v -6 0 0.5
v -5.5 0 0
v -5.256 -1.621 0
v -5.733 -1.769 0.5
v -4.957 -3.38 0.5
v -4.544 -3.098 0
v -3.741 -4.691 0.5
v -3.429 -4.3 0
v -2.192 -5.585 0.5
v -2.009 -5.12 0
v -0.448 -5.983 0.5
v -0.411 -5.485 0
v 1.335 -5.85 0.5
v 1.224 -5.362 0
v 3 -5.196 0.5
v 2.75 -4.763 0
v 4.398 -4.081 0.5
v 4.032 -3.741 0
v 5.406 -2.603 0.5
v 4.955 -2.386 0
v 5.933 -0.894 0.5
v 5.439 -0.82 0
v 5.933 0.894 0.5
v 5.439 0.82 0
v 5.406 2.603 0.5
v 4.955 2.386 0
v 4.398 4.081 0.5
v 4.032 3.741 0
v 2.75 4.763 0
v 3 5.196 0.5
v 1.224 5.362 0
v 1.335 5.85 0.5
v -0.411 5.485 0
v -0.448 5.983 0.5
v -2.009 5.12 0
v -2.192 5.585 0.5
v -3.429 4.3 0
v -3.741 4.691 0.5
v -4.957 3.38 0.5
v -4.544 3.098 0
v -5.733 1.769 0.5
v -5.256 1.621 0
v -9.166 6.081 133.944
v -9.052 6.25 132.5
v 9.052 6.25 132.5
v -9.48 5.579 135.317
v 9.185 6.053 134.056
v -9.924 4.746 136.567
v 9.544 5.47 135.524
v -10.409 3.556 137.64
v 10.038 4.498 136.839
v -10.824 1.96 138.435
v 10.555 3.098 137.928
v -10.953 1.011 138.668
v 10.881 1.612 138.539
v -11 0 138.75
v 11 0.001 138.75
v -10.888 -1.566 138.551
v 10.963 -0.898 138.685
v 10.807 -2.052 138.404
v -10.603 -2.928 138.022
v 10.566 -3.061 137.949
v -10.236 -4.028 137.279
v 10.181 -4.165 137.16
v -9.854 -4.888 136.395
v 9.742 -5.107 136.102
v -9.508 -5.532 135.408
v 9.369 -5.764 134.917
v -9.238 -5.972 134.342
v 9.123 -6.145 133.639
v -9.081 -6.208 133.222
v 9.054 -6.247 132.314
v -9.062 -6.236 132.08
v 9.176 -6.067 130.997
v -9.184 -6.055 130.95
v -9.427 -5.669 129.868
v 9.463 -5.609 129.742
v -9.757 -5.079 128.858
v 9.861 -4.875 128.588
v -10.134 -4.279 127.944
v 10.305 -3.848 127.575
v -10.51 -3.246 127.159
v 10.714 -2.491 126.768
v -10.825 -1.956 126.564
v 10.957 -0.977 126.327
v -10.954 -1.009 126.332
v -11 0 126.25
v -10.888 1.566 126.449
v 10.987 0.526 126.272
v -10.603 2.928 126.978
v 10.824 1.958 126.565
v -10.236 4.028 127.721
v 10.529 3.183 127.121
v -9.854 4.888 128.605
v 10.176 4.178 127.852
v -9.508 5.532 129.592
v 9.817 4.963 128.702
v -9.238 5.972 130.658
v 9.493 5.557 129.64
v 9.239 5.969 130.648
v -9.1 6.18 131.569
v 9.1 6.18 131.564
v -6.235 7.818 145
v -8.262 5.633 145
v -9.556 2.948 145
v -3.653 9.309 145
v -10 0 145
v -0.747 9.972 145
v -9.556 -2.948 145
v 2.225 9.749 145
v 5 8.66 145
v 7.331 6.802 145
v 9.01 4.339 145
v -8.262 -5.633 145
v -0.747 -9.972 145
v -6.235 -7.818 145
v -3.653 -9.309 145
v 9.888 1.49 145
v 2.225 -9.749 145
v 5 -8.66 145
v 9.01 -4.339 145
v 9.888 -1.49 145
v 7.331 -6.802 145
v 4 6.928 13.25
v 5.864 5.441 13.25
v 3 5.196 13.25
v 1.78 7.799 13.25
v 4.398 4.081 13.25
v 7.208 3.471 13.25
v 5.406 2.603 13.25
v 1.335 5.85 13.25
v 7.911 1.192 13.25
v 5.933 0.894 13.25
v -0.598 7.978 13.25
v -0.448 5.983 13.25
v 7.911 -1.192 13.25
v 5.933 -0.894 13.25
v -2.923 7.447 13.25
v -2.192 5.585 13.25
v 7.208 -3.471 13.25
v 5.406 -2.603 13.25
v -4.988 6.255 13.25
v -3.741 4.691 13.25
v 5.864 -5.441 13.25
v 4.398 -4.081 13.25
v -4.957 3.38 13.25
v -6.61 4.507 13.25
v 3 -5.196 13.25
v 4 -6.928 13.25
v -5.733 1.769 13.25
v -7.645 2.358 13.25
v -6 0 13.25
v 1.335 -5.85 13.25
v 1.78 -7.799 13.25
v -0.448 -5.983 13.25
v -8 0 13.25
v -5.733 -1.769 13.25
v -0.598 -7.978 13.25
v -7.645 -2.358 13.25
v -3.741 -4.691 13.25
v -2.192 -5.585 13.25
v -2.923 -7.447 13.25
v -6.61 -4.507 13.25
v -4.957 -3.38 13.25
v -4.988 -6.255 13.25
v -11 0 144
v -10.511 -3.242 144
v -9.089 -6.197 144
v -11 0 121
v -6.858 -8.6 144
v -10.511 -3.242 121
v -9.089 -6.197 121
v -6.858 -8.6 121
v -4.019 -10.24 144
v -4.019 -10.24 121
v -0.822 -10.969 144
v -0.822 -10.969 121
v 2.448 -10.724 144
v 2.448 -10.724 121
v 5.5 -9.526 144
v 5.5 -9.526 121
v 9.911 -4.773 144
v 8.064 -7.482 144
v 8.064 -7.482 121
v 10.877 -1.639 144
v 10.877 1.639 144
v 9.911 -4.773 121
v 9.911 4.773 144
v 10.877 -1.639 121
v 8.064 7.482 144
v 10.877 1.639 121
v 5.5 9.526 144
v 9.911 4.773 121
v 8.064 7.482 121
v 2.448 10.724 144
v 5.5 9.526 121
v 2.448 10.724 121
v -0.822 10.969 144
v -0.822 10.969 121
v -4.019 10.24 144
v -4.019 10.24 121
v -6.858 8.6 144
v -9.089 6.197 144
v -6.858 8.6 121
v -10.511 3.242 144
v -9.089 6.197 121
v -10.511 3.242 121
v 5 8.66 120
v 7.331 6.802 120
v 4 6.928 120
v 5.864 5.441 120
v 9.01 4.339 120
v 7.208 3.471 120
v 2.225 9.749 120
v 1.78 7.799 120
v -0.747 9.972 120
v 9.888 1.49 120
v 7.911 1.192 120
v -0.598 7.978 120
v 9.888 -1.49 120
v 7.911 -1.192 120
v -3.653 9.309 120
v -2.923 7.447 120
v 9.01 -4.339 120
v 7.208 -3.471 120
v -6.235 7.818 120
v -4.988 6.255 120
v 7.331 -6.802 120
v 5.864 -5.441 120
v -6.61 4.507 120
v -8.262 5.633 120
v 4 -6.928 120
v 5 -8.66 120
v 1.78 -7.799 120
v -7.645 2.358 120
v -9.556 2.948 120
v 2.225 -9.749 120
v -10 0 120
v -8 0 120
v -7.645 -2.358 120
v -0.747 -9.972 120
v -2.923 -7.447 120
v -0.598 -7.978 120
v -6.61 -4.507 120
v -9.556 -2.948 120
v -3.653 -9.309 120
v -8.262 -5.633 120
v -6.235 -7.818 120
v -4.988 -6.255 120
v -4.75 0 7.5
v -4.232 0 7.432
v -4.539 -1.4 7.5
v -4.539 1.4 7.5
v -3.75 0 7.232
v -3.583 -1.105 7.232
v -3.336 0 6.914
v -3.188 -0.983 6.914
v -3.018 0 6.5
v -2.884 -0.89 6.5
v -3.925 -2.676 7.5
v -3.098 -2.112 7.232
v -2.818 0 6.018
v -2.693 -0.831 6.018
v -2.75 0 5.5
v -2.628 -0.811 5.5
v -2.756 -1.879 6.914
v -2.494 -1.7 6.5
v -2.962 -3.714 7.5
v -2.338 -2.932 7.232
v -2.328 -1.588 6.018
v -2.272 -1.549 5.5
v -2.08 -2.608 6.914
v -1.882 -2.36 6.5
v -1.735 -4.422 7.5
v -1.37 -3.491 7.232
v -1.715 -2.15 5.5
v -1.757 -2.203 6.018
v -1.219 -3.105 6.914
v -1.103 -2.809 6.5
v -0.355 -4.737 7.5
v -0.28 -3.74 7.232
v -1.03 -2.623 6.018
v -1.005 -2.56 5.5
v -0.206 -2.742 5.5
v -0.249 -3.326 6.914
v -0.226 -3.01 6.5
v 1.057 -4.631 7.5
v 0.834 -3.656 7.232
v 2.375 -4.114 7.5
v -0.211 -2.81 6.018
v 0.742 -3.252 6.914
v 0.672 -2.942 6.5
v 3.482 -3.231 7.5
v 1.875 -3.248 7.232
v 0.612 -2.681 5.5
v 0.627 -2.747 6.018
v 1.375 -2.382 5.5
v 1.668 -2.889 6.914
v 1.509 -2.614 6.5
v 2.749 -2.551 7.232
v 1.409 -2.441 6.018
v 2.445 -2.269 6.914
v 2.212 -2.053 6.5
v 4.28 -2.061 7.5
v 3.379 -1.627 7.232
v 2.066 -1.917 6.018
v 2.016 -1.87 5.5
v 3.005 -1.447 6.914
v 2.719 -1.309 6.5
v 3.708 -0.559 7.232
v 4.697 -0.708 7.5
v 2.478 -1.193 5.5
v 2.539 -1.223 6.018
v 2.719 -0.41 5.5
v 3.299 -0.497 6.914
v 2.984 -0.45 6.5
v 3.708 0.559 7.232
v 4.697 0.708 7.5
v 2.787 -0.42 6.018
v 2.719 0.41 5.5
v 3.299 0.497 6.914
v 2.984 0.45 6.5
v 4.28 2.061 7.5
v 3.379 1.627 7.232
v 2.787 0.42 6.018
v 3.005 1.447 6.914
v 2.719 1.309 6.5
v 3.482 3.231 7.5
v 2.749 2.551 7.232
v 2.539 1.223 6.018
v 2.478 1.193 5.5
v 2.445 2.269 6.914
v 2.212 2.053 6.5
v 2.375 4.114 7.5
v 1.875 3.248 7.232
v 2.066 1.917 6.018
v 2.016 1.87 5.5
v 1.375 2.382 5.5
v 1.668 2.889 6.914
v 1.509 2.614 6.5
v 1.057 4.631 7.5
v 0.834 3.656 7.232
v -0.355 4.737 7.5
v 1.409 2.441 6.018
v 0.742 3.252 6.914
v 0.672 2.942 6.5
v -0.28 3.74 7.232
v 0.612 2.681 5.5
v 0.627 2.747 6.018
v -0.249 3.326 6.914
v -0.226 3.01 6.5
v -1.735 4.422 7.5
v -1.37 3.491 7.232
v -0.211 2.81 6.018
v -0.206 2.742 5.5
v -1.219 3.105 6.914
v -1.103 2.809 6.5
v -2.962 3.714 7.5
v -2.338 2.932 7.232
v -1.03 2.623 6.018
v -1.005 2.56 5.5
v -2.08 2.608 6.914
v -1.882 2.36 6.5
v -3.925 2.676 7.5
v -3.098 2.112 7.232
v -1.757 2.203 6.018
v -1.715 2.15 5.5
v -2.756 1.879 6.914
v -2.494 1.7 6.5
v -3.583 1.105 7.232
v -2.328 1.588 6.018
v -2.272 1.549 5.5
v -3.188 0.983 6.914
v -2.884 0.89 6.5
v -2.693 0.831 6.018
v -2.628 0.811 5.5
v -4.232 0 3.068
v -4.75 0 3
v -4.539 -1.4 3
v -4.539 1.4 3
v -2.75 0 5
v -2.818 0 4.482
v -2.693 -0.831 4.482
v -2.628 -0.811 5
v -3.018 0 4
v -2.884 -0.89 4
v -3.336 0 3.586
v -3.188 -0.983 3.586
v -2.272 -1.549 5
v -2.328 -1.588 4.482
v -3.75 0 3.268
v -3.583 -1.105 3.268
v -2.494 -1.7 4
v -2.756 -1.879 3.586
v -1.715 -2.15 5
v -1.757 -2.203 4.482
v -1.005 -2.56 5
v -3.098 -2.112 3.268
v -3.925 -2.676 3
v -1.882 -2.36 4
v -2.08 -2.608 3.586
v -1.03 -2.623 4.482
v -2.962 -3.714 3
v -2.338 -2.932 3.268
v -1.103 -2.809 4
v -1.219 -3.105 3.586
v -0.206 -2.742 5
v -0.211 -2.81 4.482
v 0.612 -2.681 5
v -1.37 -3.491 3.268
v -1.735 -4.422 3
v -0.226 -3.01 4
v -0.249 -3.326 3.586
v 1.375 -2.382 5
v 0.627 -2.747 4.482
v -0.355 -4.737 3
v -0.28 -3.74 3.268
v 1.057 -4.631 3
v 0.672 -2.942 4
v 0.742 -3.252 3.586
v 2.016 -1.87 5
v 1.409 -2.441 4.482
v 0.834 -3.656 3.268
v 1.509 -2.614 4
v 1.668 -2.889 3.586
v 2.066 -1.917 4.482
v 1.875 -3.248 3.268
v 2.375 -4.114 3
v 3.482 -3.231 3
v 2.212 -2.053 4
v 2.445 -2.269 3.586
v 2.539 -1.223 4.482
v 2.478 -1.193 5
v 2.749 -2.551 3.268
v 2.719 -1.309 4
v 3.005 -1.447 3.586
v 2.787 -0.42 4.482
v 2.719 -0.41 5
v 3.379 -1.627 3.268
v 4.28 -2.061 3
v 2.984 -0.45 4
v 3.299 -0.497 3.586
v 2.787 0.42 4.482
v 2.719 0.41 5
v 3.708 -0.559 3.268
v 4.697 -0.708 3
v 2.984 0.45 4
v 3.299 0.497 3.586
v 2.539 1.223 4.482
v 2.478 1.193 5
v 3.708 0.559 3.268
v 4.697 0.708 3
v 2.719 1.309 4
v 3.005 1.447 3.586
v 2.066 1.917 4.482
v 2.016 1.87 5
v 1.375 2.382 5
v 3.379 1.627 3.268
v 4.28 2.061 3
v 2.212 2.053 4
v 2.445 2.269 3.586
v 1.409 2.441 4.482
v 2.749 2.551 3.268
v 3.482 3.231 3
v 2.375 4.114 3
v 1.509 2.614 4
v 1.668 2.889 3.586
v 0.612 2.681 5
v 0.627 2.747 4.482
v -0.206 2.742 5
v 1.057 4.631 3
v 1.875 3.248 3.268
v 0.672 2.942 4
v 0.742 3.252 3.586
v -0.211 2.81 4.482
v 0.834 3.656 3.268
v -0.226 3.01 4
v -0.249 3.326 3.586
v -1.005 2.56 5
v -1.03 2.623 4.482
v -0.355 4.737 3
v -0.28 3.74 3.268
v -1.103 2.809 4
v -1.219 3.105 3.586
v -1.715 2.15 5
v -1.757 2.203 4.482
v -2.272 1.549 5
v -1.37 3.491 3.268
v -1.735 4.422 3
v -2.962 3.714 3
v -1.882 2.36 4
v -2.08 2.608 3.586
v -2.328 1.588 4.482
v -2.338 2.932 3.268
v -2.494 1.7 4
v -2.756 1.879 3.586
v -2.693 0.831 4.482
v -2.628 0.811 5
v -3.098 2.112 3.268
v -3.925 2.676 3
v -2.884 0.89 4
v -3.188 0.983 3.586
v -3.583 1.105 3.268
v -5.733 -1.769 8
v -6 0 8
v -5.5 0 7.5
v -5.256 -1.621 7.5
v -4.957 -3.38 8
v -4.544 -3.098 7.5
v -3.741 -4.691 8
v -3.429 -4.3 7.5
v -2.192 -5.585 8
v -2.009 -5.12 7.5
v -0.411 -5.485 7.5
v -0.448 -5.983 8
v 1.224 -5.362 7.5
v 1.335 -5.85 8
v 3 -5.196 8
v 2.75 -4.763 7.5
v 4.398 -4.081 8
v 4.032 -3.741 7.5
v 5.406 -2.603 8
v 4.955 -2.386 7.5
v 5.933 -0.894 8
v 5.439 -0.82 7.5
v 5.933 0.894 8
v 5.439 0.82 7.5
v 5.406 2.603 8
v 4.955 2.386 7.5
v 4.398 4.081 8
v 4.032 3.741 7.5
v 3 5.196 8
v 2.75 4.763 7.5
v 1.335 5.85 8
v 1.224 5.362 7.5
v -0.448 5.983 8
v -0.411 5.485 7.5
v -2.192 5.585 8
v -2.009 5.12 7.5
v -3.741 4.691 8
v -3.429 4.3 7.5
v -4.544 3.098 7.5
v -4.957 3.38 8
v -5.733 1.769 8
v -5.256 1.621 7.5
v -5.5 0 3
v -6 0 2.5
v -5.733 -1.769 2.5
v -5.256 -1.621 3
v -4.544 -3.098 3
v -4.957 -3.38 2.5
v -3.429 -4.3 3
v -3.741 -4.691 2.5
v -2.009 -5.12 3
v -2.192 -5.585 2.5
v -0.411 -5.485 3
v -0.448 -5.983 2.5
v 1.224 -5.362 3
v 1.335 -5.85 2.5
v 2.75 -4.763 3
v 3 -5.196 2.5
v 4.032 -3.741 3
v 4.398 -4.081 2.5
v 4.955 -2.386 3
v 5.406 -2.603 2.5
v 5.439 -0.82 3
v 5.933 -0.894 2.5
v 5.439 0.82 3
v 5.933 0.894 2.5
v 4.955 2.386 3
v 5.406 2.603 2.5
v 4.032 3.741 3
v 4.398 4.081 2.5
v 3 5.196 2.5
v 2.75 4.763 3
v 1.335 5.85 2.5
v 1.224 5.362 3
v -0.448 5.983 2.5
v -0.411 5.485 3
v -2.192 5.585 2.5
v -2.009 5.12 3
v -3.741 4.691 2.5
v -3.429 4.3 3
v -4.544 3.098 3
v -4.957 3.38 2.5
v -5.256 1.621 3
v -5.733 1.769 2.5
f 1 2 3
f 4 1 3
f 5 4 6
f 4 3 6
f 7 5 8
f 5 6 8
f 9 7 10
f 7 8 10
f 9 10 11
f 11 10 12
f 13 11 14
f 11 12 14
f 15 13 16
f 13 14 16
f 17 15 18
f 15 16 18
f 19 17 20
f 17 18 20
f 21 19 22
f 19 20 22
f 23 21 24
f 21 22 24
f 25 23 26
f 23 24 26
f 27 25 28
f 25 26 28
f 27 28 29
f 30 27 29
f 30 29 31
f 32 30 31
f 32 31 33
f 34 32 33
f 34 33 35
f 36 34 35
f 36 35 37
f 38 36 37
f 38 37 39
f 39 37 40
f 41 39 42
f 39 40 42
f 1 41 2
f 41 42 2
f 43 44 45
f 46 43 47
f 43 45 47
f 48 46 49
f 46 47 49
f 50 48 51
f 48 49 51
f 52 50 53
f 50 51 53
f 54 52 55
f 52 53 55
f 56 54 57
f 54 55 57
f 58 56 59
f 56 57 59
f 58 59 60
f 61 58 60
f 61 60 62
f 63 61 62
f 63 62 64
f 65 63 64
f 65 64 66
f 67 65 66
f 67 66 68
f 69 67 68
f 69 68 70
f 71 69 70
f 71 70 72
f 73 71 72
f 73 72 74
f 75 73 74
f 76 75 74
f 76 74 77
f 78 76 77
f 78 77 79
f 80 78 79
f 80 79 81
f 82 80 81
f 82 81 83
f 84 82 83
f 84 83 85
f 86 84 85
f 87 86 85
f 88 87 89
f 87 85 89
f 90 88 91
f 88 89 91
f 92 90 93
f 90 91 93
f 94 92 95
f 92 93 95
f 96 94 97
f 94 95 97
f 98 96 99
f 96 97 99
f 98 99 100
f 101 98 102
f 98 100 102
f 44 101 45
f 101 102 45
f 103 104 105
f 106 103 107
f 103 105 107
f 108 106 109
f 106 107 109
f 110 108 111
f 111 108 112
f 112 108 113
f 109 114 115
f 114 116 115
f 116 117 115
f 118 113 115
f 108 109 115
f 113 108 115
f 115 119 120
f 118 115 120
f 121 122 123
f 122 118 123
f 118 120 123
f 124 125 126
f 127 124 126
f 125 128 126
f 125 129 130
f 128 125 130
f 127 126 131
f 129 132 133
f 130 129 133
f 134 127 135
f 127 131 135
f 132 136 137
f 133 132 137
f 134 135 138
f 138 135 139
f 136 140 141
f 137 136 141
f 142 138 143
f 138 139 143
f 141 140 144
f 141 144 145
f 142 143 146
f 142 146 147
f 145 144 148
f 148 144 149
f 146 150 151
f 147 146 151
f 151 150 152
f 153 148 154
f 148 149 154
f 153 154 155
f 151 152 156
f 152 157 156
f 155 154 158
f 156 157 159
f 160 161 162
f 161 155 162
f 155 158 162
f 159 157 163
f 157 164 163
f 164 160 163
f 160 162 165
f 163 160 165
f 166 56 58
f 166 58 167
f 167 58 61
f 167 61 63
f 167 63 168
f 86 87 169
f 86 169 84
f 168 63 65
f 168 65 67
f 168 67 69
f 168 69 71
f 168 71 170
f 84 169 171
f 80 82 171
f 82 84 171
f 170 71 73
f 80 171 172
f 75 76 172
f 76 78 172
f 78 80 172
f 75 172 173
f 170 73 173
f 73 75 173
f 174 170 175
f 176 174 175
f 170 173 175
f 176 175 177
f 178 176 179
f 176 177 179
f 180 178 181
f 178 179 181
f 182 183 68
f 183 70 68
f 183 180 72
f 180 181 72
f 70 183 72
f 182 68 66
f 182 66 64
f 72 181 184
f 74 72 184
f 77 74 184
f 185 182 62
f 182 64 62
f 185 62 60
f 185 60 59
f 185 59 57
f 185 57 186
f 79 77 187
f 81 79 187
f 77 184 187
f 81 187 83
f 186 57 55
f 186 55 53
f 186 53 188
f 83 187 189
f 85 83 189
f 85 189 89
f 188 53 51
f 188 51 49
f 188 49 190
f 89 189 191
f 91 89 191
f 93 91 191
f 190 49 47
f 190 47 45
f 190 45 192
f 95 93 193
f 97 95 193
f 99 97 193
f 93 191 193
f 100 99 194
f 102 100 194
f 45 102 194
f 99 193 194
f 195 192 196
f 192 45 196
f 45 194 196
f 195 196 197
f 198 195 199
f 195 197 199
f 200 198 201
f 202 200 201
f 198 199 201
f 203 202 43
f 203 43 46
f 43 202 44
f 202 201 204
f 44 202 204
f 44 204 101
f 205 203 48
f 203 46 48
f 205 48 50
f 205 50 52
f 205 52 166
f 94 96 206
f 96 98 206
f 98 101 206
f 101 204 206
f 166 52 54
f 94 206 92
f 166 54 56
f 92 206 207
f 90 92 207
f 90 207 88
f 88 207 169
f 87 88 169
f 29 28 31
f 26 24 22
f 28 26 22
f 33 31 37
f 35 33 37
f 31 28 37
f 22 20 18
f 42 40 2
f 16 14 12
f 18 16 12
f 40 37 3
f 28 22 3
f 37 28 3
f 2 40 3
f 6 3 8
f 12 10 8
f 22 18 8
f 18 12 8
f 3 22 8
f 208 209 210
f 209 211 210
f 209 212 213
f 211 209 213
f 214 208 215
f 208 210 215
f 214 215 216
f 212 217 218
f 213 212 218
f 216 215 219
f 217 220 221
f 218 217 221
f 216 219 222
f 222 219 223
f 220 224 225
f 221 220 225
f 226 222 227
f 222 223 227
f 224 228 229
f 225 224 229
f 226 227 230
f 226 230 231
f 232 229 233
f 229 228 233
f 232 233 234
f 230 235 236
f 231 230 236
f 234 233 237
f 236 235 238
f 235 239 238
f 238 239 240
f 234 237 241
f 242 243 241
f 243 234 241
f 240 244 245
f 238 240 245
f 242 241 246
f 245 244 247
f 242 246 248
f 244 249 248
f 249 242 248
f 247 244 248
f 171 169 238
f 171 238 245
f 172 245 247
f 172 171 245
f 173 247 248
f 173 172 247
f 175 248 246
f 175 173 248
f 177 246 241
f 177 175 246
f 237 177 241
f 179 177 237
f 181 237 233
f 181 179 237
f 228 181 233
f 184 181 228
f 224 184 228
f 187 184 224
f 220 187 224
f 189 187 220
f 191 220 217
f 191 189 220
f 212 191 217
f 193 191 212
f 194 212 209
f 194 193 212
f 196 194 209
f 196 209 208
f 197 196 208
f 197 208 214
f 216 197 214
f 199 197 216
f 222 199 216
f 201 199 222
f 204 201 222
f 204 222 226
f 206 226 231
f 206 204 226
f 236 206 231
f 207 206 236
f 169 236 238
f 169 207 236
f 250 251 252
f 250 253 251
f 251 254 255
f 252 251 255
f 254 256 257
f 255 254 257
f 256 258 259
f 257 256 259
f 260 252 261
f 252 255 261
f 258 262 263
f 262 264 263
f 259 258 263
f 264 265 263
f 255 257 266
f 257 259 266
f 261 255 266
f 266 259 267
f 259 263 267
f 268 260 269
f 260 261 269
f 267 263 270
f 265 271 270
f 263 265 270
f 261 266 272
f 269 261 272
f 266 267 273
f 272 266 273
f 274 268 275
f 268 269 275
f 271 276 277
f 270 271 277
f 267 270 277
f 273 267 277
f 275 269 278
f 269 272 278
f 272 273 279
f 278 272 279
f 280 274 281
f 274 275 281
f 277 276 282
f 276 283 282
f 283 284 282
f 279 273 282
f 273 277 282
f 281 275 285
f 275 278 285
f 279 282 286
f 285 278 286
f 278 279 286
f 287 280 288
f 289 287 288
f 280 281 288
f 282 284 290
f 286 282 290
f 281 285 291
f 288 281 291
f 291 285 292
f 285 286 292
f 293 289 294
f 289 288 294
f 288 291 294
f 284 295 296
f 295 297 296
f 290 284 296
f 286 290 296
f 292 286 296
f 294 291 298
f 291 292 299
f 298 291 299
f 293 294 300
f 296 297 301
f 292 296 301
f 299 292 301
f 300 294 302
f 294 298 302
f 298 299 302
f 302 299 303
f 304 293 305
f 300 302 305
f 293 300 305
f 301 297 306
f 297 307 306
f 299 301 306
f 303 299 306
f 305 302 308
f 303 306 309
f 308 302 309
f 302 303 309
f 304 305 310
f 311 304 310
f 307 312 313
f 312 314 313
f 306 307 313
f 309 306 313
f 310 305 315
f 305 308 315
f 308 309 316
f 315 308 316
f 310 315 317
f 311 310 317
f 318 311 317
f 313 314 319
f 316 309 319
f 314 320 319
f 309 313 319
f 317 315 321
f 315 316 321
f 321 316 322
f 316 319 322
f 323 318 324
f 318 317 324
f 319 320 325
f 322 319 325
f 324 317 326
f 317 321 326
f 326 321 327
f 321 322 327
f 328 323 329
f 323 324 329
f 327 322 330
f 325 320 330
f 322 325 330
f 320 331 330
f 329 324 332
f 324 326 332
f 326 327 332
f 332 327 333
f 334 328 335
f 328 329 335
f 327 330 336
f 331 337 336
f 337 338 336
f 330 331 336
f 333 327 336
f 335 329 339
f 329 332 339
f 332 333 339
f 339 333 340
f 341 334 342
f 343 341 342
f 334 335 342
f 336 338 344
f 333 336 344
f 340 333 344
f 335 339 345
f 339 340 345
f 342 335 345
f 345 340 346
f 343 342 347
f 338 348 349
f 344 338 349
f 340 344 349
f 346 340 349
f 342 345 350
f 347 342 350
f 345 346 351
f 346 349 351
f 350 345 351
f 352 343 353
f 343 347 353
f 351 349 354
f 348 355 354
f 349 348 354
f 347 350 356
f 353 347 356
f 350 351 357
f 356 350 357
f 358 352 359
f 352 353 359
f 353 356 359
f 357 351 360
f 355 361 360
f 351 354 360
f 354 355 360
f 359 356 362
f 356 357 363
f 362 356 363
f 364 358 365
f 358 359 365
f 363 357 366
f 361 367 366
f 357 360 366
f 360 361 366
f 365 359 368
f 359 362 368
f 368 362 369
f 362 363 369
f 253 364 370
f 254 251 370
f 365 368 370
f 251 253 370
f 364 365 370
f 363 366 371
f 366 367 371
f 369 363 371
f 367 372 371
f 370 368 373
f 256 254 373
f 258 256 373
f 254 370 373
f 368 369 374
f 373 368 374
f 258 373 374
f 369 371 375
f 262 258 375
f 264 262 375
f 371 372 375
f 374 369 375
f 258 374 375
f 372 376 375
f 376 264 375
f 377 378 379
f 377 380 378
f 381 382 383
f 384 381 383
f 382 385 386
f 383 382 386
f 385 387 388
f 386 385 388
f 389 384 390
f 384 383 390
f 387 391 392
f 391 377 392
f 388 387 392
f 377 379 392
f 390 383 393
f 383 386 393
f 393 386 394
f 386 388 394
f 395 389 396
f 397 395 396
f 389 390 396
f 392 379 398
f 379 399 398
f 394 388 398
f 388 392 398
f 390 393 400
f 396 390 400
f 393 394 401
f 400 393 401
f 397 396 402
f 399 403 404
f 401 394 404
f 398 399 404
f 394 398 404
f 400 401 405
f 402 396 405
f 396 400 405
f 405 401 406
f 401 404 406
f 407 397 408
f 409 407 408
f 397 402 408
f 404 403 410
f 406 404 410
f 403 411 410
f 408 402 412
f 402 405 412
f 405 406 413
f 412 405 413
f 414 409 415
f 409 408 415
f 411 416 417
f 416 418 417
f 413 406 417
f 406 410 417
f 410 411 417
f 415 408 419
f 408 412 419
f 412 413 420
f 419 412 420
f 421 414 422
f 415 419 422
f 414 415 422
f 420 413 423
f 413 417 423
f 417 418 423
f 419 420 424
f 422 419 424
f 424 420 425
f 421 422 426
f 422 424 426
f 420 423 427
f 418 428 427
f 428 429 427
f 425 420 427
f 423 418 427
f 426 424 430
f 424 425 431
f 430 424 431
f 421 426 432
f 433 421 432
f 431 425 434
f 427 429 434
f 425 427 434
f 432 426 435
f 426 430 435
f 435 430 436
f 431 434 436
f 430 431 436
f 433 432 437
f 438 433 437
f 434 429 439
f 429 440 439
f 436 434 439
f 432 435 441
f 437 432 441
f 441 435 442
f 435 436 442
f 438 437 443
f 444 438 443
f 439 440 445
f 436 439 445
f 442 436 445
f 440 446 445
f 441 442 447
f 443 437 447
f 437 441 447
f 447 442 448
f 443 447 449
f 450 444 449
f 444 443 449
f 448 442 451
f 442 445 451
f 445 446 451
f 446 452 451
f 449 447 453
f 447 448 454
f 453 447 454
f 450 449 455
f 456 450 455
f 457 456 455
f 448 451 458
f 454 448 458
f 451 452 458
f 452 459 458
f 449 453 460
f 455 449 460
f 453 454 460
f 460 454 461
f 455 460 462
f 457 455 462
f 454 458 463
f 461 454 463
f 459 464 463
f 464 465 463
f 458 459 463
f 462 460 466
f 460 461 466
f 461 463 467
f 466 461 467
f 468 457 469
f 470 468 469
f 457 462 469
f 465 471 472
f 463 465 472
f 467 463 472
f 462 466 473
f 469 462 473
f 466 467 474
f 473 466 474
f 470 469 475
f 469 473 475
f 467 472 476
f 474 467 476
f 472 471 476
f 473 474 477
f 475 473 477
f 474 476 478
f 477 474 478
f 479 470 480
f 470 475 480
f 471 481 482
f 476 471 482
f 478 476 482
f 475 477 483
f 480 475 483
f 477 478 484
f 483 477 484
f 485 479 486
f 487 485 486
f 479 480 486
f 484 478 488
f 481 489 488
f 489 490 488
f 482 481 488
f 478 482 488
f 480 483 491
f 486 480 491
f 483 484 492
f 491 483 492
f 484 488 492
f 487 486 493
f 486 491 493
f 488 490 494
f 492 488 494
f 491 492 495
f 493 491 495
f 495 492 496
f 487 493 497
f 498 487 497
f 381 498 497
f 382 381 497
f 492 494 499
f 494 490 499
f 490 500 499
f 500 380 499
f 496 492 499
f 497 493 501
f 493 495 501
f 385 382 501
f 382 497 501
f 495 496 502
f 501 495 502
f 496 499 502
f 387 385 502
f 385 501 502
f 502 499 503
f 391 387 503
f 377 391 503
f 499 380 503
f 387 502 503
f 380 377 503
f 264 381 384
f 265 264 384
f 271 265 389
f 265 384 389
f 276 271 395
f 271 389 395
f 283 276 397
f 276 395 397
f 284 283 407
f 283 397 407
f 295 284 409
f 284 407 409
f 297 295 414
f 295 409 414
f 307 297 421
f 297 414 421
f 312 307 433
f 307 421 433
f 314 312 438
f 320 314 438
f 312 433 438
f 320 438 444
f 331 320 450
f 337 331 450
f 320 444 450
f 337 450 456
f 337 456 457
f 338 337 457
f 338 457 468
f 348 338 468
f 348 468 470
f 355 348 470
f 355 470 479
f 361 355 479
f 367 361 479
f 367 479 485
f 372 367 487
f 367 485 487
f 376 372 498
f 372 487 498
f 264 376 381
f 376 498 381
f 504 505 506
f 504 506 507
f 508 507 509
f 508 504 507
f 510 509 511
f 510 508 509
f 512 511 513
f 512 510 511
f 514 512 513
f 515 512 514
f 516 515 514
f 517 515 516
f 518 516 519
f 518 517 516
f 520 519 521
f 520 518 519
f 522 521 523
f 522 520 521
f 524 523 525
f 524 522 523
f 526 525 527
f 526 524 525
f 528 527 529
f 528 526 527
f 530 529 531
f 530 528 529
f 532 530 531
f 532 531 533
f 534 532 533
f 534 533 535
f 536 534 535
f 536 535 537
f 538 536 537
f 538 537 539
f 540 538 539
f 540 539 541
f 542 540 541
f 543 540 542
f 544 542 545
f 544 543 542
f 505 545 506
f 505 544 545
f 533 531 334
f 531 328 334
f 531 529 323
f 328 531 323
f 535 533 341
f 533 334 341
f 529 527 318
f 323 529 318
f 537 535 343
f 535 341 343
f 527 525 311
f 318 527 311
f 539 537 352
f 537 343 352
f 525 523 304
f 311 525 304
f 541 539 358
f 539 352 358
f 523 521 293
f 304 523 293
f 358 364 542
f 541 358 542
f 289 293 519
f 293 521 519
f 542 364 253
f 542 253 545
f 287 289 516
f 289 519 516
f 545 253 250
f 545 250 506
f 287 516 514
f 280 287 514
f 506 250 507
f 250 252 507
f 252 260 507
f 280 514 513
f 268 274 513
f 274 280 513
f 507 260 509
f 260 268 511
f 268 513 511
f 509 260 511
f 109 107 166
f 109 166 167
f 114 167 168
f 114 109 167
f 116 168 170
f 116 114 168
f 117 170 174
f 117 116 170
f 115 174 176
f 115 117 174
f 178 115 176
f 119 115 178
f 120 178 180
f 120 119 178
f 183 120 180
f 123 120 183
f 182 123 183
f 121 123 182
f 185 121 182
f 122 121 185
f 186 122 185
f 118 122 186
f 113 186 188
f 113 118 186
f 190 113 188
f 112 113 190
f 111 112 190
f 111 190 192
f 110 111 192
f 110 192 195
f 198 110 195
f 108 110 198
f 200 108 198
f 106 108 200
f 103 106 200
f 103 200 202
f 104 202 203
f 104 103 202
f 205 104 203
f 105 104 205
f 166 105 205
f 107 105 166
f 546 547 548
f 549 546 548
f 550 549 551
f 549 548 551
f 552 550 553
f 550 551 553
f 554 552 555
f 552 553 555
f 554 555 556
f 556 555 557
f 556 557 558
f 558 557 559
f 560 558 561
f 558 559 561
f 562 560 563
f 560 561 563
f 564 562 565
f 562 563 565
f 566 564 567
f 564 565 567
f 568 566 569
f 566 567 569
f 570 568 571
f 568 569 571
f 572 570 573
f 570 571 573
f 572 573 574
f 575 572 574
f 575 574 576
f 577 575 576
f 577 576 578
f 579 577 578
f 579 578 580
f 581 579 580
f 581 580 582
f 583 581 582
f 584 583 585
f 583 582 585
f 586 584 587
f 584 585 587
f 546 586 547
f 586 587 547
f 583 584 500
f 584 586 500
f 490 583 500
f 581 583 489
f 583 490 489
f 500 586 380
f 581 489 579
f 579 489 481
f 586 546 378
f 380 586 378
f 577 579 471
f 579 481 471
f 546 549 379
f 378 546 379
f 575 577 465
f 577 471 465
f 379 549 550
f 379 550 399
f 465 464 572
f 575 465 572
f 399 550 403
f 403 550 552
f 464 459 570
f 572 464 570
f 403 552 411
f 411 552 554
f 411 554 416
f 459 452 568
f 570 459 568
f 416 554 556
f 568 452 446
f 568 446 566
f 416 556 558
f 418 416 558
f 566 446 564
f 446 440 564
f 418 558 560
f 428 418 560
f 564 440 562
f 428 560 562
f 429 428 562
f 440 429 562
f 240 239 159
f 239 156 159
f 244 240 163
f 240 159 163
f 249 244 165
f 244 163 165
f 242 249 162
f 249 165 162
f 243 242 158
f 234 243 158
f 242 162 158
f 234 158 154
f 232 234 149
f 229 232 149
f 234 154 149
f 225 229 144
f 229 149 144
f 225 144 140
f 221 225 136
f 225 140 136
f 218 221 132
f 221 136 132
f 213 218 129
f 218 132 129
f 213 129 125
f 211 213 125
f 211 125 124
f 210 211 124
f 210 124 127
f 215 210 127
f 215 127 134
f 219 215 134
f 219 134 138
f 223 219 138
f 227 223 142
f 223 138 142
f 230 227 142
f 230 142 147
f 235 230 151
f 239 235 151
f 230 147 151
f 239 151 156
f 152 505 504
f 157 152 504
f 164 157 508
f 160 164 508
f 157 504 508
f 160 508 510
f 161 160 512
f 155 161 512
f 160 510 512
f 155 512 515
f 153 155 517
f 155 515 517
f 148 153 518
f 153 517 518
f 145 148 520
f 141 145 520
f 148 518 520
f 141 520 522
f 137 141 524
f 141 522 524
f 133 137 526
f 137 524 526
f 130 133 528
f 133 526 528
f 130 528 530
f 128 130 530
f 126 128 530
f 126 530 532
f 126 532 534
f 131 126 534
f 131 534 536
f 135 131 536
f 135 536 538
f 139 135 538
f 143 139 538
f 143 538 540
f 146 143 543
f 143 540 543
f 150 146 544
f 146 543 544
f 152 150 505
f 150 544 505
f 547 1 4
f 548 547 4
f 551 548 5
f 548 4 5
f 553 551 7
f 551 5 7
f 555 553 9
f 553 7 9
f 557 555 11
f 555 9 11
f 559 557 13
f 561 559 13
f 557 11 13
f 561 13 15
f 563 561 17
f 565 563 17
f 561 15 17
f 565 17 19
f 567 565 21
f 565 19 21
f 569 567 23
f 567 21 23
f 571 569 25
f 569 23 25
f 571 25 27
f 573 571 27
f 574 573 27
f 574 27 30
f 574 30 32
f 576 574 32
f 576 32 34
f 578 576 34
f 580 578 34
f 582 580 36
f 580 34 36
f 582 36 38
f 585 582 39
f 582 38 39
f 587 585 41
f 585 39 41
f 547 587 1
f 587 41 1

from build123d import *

# Parameters (mm, degrees)
F2_R     = 2
F3_SIZE  = 0.5
F4_R     = 6.25
F5_DEPTH = 20.1
F6_SIZE  = 1


with BuildPart() as f1:
    # F0 (on Front) → F1 (revolve)
    with BuildSketch(Plane.XZ):
        Polygon((-6, 0), (0, 0), (0, 145), (-11, 145), (-11, 120), (-8, 120), (-8, 13.25), (-6, 13.25), (-6, 7.5), (-2.75, 7.5), (-2.75, 3), (-6, 3), align=None)
    revolve(axis=Axis((0, 0, 49.5666371724), (0, 0, 1)))

    # F2
    f2_edges = [f1.edges().sort_by_distance(p)[0] for p in [
        (2.75, 0, 7.5),
        (2.75, 0, 3),
        (-2.75, 0, 5.25),
    ]]
    fillet(f2_edges, radius=F2_R)

    # F3
    f3_edges = [f1.edges().sort_by_distance(p)[0] for p in [
        (6, 0, 7.5),
        (6, 0, 3),
        (6, 0, 0),
    ]]
    chamfer(f3_edges, length=F3_SIZE)

    # F4 (on Right) → F5 (cut, symmetric)
    with BuildSketch(Plane.YZ):
        with Locations((0, 132.5)):
            Circle(F4_R)
    extrude(amount=F5_DEPTH, both=True, mode=Mode.SUBTRACT)

    # F6
    f6_edges = [f1.edges().sort_by_distance(p)[0] for p in [
        (11, 0, 145),
        (11, 0, 120),
    ]]
    chamfer(f6_edges, length=F6_SIZE)


solid = f1.part
